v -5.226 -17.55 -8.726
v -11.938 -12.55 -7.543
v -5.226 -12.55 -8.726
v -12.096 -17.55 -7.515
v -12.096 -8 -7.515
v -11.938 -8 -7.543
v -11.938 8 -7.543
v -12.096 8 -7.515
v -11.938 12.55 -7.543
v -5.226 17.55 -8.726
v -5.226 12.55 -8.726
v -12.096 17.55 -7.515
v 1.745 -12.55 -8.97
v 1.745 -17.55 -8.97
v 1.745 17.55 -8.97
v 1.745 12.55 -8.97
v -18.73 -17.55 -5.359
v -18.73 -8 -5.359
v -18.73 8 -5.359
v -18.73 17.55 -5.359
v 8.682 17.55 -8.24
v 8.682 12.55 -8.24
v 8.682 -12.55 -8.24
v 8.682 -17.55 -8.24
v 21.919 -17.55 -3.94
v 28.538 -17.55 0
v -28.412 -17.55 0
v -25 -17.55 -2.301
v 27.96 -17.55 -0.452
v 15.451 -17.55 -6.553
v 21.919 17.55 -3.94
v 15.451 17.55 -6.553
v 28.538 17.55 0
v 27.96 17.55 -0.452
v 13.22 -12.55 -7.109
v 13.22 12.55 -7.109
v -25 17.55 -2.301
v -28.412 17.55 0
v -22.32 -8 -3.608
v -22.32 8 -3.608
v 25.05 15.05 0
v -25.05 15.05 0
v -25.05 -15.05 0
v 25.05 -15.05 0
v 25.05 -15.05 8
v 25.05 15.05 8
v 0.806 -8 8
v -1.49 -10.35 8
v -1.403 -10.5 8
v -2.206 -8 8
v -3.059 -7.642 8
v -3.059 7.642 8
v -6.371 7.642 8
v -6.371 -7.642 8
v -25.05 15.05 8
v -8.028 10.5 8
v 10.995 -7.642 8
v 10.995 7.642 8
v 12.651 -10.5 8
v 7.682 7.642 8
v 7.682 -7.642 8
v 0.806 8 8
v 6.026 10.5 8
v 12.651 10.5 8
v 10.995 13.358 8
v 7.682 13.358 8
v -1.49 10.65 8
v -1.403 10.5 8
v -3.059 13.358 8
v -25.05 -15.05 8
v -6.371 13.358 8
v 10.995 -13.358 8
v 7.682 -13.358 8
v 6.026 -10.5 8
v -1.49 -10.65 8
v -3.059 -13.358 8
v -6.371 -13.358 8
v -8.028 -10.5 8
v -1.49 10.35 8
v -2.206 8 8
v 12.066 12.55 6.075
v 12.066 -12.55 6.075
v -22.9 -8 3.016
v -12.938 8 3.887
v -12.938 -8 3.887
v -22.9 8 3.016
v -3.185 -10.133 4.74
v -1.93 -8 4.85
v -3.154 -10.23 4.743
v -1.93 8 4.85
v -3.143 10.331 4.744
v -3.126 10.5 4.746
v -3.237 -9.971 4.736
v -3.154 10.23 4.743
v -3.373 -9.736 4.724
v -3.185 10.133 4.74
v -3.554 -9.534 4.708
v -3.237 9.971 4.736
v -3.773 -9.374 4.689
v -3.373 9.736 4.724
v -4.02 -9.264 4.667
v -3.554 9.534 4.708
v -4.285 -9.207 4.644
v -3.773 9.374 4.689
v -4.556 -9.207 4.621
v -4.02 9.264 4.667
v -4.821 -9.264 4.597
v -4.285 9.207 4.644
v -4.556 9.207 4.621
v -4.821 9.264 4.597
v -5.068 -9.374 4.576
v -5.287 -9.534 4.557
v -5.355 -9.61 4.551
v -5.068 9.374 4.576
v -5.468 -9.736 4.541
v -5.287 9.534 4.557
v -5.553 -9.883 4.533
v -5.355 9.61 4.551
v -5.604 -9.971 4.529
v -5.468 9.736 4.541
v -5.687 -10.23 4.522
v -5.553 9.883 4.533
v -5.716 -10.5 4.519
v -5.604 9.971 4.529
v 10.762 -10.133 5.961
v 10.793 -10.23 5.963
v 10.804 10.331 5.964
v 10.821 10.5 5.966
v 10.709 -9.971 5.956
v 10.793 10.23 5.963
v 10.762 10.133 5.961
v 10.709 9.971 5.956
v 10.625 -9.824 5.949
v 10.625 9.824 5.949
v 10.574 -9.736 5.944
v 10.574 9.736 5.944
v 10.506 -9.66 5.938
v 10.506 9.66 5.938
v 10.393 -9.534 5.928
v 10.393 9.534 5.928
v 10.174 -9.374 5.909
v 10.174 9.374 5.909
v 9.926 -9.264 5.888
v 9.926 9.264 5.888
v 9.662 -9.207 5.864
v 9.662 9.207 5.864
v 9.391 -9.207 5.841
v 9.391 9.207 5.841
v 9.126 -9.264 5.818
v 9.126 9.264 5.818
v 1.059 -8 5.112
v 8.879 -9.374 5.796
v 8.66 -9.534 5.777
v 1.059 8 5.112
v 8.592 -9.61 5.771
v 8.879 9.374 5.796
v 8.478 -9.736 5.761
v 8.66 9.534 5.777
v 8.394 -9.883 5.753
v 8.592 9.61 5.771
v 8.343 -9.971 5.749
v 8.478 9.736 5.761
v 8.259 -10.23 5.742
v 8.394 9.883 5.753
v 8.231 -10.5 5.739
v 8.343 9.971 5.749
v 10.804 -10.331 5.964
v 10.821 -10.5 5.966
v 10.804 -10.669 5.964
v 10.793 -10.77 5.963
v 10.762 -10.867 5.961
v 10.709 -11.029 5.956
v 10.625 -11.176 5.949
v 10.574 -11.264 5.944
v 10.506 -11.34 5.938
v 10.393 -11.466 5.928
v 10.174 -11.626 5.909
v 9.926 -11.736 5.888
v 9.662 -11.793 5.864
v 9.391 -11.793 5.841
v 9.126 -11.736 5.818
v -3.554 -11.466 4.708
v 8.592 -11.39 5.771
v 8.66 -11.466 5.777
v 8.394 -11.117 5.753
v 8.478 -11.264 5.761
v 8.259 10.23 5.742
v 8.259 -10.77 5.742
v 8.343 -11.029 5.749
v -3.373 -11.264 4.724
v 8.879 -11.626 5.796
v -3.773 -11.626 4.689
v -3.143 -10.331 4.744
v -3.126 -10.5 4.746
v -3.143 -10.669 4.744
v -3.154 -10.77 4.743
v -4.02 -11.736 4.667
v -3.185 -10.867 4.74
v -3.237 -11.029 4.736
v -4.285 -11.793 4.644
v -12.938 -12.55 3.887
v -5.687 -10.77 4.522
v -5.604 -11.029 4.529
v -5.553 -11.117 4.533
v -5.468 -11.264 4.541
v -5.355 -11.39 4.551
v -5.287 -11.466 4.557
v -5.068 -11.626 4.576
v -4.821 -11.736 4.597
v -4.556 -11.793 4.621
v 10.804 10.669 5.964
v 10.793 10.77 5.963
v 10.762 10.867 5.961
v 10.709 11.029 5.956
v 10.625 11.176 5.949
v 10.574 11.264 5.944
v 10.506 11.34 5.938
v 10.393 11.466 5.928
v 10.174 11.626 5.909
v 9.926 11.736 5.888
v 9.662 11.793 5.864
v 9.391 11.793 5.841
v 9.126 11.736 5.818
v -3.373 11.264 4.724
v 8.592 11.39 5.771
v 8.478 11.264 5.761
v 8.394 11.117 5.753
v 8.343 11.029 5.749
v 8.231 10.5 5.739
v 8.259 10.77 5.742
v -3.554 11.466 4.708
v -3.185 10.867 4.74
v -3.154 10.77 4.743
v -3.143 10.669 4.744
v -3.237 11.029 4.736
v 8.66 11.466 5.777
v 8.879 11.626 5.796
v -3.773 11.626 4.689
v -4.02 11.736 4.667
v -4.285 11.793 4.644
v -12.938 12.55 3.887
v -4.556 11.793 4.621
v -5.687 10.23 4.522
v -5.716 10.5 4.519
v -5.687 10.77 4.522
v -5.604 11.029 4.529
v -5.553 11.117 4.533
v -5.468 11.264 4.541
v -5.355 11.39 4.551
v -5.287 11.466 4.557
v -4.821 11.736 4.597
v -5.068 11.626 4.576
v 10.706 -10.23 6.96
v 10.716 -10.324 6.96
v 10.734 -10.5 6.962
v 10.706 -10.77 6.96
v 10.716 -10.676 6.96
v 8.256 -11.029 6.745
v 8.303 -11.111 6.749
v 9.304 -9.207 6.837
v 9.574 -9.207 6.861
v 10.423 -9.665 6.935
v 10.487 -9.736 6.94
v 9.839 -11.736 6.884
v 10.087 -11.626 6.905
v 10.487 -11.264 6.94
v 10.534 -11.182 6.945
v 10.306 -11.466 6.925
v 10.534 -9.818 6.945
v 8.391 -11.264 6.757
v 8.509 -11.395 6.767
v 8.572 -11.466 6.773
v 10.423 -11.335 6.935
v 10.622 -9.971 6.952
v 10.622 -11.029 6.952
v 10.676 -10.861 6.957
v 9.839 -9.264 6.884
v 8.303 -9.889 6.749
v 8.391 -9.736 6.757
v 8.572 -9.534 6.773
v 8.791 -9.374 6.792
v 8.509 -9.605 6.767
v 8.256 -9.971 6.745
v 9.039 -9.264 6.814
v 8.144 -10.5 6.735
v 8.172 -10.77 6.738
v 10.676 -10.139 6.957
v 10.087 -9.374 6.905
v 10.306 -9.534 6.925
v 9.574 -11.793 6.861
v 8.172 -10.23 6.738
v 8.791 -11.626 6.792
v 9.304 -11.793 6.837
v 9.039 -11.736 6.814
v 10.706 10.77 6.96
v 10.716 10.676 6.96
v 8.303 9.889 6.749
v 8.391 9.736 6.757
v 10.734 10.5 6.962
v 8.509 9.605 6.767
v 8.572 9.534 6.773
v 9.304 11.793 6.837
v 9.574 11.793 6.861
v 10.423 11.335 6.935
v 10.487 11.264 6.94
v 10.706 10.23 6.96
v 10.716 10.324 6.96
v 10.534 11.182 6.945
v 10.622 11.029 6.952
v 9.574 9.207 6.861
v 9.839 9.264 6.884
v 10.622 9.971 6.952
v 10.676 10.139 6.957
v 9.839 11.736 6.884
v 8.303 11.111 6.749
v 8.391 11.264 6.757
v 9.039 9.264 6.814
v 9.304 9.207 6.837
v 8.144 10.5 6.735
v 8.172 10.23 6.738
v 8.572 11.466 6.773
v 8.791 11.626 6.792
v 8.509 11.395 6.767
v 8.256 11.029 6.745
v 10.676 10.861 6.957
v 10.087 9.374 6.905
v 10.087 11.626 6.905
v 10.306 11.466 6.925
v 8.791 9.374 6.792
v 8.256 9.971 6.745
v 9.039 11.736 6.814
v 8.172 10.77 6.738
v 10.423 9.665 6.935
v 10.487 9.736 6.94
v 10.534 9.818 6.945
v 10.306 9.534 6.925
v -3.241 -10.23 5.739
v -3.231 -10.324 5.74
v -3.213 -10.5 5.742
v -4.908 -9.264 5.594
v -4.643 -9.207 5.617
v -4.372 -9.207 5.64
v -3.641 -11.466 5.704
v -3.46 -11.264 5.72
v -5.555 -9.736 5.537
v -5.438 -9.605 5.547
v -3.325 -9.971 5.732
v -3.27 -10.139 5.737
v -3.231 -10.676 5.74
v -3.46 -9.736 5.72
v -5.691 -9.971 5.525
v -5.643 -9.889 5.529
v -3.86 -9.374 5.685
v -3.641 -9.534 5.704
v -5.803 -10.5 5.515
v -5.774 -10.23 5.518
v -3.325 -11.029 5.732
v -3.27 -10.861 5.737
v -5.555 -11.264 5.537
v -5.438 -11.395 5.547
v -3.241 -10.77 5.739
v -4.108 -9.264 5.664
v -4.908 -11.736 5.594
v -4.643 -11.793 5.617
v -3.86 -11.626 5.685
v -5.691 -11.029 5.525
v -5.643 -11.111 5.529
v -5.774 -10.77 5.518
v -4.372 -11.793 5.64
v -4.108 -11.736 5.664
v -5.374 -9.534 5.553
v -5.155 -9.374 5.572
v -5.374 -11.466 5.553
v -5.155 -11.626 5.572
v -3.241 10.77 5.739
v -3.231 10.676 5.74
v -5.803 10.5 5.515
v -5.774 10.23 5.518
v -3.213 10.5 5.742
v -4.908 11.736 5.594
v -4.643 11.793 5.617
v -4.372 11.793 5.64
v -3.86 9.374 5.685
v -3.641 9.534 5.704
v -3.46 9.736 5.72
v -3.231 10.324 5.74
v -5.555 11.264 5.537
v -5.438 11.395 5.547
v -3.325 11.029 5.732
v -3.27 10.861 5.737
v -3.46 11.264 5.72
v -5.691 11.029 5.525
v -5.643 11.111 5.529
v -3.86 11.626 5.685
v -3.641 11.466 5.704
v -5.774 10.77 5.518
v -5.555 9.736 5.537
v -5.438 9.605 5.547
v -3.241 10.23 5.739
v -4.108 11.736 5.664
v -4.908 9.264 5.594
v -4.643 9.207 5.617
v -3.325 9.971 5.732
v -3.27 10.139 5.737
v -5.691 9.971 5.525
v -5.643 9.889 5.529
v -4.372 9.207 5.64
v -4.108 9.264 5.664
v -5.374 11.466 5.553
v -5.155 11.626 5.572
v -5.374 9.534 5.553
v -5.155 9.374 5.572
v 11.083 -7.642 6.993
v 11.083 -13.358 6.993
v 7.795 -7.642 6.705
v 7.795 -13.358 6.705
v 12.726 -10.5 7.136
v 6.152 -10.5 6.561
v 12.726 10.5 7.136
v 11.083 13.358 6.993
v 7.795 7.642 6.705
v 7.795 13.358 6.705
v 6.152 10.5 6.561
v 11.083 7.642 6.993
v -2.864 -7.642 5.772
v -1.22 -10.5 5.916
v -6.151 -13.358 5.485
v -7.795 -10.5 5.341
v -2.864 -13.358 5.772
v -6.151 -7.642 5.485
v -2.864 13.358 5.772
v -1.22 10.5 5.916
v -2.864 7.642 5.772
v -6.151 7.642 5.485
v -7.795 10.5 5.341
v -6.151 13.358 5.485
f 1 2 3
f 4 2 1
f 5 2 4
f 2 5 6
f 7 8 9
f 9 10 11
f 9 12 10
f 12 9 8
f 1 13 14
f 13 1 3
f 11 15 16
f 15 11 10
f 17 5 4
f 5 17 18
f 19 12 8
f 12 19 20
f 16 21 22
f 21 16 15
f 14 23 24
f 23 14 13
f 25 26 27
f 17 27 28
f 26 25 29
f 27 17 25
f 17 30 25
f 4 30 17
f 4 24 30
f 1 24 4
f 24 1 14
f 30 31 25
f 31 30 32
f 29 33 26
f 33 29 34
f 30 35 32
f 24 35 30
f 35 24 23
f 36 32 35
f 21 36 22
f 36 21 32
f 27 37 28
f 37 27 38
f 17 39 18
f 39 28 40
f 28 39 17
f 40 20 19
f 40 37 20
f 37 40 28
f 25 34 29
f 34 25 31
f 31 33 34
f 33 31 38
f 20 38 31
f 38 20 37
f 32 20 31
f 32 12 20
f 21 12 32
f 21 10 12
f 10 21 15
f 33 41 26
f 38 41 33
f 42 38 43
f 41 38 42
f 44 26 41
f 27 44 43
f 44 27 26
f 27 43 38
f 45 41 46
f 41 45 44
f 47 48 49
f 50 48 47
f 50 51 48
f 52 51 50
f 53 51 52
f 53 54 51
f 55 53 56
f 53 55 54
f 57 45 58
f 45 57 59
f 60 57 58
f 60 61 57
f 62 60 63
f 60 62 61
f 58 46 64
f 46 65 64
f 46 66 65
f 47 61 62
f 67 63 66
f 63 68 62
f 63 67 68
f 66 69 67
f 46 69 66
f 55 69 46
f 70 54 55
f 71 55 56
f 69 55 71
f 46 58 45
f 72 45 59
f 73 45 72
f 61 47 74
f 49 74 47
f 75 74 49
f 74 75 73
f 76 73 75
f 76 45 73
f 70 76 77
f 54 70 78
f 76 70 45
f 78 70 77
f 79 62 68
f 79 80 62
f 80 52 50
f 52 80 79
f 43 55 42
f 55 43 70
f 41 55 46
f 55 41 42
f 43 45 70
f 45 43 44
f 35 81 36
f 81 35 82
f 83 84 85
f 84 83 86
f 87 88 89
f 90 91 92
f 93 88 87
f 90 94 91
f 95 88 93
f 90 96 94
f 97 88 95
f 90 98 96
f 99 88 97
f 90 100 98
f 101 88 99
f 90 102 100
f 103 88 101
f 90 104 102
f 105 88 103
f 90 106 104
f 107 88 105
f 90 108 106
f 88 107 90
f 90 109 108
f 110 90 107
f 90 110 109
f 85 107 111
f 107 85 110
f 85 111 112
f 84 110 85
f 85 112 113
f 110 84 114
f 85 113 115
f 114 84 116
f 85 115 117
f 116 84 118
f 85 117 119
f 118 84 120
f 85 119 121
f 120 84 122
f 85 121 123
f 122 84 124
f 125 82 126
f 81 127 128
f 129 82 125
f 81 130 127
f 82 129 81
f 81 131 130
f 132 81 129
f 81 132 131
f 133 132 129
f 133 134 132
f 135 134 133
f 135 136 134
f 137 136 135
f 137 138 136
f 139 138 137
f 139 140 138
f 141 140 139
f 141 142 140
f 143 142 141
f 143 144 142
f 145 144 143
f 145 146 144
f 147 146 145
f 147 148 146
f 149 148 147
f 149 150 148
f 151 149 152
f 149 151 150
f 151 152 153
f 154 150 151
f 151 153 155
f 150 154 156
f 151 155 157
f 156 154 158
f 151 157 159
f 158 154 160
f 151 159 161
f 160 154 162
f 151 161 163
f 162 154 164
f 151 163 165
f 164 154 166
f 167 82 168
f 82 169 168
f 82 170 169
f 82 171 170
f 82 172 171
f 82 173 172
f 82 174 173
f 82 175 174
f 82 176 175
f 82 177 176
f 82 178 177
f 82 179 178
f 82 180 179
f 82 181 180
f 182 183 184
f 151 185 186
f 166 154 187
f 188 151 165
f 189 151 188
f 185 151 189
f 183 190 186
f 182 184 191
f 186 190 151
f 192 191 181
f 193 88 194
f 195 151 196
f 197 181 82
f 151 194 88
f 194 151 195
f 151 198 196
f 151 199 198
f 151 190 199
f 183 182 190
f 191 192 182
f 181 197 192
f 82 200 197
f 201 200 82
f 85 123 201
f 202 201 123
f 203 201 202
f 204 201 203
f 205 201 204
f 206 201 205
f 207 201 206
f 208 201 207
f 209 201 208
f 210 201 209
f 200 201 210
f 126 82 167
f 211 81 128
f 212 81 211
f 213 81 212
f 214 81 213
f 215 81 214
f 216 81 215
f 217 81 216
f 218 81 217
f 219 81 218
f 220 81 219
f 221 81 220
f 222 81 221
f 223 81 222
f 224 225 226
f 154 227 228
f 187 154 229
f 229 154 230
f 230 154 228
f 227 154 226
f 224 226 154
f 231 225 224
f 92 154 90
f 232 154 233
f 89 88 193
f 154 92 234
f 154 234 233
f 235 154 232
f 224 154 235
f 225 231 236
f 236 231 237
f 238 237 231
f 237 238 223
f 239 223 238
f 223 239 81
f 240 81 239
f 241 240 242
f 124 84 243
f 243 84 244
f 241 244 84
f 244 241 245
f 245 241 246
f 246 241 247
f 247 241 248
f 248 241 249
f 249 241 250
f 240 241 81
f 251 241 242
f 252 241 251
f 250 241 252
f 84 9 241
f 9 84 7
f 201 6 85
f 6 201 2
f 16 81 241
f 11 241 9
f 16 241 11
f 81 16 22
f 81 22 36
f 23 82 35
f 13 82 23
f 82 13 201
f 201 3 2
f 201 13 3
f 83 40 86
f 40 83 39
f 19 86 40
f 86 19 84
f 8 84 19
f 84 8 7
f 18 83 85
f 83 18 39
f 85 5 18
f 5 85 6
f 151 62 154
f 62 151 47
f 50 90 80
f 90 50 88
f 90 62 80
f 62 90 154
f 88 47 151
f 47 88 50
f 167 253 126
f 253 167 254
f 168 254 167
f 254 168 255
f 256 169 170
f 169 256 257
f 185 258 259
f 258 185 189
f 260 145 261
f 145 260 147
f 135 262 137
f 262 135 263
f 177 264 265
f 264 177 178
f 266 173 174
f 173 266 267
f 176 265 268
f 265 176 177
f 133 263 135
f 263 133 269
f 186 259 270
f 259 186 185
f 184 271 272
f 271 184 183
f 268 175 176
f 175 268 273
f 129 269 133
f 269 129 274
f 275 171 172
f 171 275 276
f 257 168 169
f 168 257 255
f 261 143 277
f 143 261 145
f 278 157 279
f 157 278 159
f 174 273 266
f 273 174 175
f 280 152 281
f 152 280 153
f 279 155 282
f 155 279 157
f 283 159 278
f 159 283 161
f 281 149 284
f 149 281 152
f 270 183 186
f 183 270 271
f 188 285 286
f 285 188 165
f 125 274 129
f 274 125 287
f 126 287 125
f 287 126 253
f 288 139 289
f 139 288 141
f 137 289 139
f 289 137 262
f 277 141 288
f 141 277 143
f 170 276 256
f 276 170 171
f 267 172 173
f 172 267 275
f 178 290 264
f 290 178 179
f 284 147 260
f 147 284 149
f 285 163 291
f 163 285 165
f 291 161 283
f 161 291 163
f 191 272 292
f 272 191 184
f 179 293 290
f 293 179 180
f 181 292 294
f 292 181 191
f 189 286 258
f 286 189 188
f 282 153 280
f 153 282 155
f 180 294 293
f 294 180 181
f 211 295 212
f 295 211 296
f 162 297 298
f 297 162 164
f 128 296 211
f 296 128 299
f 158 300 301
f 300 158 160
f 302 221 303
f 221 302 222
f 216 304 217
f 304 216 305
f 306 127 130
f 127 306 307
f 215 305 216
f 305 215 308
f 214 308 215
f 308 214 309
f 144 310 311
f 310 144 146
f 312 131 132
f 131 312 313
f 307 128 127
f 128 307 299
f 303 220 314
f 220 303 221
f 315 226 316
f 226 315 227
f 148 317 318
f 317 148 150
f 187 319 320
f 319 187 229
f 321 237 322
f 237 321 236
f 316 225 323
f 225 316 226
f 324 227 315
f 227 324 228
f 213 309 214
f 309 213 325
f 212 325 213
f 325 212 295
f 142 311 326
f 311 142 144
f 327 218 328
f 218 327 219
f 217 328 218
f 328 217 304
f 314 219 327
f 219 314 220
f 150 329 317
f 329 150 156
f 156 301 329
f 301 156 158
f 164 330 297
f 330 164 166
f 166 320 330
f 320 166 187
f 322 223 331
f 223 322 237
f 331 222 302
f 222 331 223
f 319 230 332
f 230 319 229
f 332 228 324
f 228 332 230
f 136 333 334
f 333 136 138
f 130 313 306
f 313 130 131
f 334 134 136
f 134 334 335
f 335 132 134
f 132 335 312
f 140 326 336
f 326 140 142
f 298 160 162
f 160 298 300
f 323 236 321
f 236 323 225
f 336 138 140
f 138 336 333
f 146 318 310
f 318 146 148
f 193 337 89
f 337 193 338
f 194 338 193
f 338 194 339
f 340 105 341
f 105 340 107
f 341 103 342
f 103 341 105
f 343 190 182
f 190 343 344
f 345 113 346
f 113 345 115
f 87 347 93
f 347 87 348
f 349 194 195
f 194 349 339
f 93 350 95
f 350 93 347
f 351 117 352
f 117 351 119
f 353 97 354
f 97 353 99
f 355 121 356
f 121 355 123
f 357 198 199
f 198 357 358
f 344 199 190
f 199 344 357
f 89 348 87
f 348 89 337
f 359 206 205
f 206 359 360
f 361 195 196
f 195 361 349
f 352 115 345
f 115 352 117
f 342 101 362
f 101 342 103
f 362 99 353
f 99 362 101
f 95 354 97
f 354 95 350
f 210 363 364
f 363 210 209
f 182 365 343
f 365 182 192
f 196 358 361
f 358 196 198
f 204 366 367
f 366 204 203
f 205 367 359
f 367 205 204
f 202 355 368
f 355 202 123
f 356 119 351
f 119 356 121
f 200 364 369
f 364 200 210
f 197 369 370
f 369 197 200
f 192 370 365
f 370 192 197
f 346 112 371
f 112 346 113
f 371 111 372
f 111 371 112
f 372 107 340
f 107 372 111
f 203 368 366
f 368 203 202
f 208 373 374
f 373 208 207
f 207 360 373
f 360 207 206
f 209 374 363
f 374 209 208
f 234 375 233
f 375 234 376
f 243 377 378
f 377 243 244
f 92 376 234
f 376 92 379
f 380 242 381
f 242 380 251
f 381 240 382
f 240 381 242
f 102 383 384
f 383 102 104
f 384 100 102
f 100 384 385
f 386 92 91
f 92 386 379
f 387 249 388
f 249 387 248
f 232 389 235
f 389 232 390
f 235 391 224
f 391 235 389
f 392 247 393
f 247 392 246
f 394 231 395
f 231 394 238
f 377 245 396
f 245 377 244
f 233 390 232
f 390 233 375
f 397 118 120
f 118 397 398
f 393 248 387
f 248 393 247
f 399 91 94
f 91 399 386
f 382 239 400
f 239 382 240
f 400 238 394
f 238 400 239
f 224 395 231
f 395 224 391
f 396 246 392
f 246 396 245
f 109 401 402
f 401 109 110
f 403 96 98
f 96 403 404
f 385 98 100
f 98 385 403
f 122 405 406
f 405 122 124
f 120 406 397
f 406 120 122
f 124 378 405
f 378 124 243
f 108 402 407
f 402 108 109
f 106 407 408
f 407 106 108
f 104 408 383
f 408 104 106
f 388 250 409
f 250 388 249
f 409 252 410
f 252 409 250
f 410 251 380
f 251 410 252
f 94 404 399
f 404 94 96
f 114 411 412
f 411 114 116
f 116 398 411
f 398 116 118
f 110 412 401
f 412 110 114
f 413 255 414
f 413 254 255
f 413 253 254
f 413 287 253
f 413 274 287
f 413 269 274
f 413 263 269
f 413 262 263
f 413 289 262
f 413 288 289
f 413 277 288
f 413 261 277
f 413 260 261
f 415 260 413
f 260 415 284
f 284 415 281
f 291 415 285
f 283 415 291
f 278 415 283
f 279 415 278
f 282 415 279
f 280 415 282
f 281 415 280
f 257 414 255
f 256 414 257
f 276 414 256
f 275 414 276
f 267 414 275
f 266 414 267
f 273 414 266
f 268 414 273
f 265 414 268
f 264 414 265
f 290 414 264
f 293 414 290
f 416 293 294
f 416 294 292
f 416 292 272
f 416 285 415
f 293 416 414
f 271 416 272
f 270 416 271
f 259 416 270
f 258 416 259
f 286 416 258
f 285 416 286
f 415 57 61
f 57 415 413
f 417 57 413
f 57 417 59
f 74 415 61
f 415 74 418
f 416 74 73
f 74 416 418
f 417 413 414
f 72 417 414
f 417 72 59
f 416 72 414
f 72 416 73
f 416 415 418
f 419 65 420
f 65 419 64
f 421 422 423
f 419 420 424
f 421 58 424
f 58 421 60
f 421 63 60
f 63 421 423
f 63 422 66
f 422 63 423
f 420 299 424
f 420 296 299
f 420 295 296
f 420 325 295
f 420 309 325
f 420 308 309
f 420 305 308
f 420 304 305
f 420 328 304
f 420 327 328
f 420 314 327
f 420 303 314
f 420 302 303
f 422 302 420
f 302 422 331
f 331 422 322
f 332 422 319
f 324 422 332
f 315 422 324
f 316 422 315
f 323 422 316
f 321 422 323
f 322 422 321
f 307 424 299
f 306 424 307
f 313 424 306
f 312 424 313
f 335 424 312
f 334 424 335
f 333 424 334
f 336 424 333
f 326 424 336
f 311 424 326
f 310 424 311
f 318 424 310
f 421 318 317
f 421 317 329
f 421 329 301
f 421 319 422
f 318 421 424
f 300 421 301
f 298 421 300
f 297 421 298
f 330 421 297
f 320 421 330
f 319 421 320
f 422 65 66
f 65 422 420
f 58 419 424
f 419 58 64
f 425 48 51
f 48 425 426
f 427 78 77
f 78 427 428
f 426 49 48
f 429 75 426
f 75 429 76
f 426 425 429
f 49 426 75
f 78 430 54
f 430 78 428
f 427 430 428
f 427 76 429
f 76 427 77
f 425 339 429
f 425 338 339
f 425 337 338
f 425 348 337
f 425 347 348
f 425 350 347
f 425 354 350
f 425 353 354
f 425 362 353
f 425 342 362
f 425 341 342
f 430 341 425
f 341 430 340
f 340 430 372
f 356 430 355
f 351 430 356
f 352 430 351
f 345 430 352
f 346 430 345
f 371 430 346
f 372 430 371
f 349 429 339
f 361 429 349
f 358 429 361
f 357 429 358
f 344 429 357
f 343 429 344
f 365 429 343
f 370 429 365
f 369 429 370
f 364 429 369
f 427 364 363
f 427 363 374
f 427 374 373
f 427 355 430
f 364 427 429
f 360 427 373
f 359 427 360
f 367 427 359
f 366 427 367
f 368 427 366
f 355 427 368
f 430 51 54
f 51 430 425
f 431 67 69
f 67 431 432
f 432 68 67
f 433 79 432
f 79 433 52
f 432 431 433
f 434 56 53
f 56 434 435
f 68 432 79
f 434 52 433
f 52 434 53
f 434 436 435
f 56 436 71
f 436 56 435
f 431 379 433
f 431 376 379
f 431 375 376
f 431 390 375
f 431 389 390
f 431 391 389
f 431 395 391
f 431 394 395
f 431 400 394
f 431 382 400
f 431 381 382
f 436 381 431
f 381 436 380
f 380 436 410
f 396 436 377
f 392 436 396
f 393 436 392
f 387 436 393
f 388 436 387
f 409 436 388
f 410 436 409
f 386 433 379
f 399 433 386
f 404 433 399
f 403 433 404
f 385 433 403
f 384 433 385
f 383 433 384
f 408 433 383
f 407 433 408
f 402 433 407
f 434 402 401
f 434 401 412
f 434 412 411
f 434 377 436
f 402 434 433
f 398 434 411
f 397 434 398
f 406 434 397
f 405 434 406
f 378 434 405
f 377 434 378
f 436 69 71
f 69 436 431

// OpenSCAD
a = 100;
b = 42;
bMain = 80;

t = 10;

r = 5;
d = 20;

module square(a,b,t,r) {
hull(){
translate([a/2-r,b/2-r,0])cylinder(r=5,h=t,$fn=30);
translate([-a/2+r,-b/2+r,0])cylinder(r=5,h=t,$fn=30);
translate([-a/2+r,b/2-r,0])cylinder(r=5,h=t,$fn=30);
translate([a/2-r,-b/2+r,0])cylinder(r=5,h=t,$fn=30);
}
 }


module main(a,b,t,r,d, holes=true){
difference(){ 
   
translate([0,0, 0])square(a,b,t,r);
translate([0,0,-1])square(a-d,b-d,t+2,r); 
    
 if (holes){
translate([-(a+d)/2,b/2-d,t/2])rotate([0,90,00])cylinder(r=3/2,h=(a+d),$fn=30);
translate([-(a+d)/2,-b/2+d,t/2])rotate([0,90,00])cylinder(r=3/2,h=(a+d),$fn=30); 
translate([0,(b+d)/2,t/2])rotate([90,0,00])cylinder(r=3/2,h=(b+d),$fn=30); 
translate([a/2-d,(b+d)/2,t/2])rotate([90,0,00])cylinder(r=3/2,h=(b+d),$fn=30); 
translate([-a/2+d,(b+d)/2,t/2])rotate([90,0,00])cylinder(r=3/2,h=(b+d),$fn=30); 
    
translate([a/2-d+5,b/2-d/4,-t/2])rotate([0,0,0])cylinder(r=3/2,h=(b+d),$fn=30); 
translate([-a/2+d-5,b/2-d/4,-t/2])rotate([0,0,0])cylinder(r=3/2,h=(b+d),$fn=30); 
translate([a/2-d+5,-b/2+d/4,-t/2])rotate([0,0,0])cylinder(r=3/2,h=(b+d),$fn=30); 
translate([-a/2+d-5,-b/2+d/4,-t/2])rotate([0,0,0])cylinder(r=3/2,h=(b+d),$fn=30); 

translate([-a/2+d/4,-b/2+d/2,-t/2])rotate([0,0,0])cylinder(r=3/2,h=(b+d),$fn=30); 
translate([+a/2-d/4,-b/2+d/2,-t/2])rotate([0,0,0])cylinder(r=3/2,h=(b+d),$fn=30); 
translate([-a/2+d/4,-b/2+d/2,-t/2])rotate([0,0,0])cylinder(r=3/2,h=(b+d),$fn=30); 
    
translate([+a/2-d/4,-b/2+d/2,-t/2])rotate([0,0,0])cylinder(r=3/2,h=(b+d),$fn=30); 
translate([-a/2+d/4,+b/2-d/2,-t/2])rotate([0,0,0])cylinder(r=3/2,h=(b+d),$fn=30); 
translate([+a/2-d/4,+b/2-d/2,-t/2])rotate([0,0,0])cylinder(r=3/2,h=(b+d),$fn=30);   




}
}

}

module motor(a,b,t,r,d, holes=true){
difference(){
 union(){
  main(a,b,10,r,d, true);
  translate([0,0,0])cylinder(r=42/2,h=t,$fn=30);
 }
translate([0,0,-1])cylinder(r=22/2,h=t+2,$fn=30);
 
translate([0,-33/2,-t/2])rotate([0,0,0])cylinder(r=3/2,h=(b+d),$fn=30); 
translate([0,33/2,-t/2])rotate([0,0,0])cylinder(r=3/2,h=(b+d),$fn=30); 
translate([-33/2,0,-t/2])rotate([0,0,0])cylinder(r=3/2,h=(b+d),$fn=30); 
translate([33/2,0,-t/2])rotate([0,0,0])cylinder(r=3/2,h=(b+d),$fn=30); 
};
}


module tail(a,b,t,r,d,){
difference(){
main(a,55,16,r,d, true);

mirror([1,0,0])
translate([5,0,0])rotate([0,0,45])translate([0,0,3])cube([50,5,10]);
translate([5,0,0])rotate([0,0,45])translate([0,0,3])cube([50,5,10]);
translate([-60,-65-13,-20])cube([120,65,40]);
}
}


module servoHolder(a,b,t,r,d,){
difference(){
union(){
hull(){
translate([-23/2-10,-12-10,0])cube([23+30,2*12+20,1]);
translate([-23/2-5,-12-5,8])cube([23+10,2*12+10,1]);
}
hull(){
translate([12,-15/2,0])cube([50,15,1]);
translate([12,-15/2,8])cube([40,15,1]);
}

translate([-23/2-5,-12-5,-3])cube([23+10,2*12+10,3]);


}

translate([-23/2,-12.3,-20])cube([23,2*12.3,40]);
translate([+27/2,-6,-10])cylinder(r=1.2,h=30,$fn=50);
translate([+27/2,+6,-10])cylinder(r=1.2,h=30,$fn=50);
translate([-27/2,-6,-10])cylinder(r=1.2,h=30,$fn=50);
translate([-27/2,+6,-10])cylinder(r=1.2,h=30,$fn=50);
translate([40,-8.05/2,-10])cube([8.05,8.05,50]);
}
}


// ------------------------------
module wingMount(alpha=3) {
difference(){
    

   hull(){
    rotate([0,-alpha,0])translate([-160/2,-110/2,-4])cube([160,110,9]);
    translate([-10/2+100,-80/2,-0])cube([10,80,3]);
   }
   translate([-200/2,-200/2,-40])cube([200,200,40]);
   translate([-105/2+15-15,-80/2,-10])cube([120,80,40]);
   
   translate([50,+48,-10])cylinder(r=1.5,h=30,$fn=50);
   translate([50,-48,-10])cylinder(r=1.5,h=30,$fn=50);
   translate([-50,+48,-10])cylinder(r=1.5,h=30,$fn=50);
   translate([-50,-48,-10])cylinder(r=1.5,h=30,$fn=50);  
   
   translate([50,+48,-26])cylinder(r=7/2,h=30,$fn=6);
   translate([50,-48,-26])cylinder(r=7/2,h=30,$fn=6);
   translate([-50,+48,-26])cylinder(r=7/2,h=30,$fn=6);
   translate([-50,-48,-26])cylinder(r=7/2,h=30,$fn=6);   
   
}
hull(){
    translate([-10/2+82,-110/2,-0])cube([3,110,20]);
    translate([-10/2+100,-80/2,-0])cube([10,80,5]);
}

}
   
// ------------------------------

module piCamHolder(xcam=25.1, xcable=16.0, camTilt=5.0, zcamOff=10, zCircOff=41) {
  
  difference(){
  // ----------------------
  union(){
  difference(){
  hull(){
      translate([0,-xcam/2,zCircOff])
      rotate([90,0,0])
      cylinder(r=50,h=5,$fn=45);
      
      translate([0,xcam/2+5,zCircOff])
      rotate([90,0,0])
      cylinder(r=50,h=5,$fn=45);
  }
  translate([-100,-100,0])
  cube([200,200,200]);
  
  }
  translate([-(xcam+25)/2,-(xcam+5)/2,0])
  cube([xcam+25,xcam+5,8]);
  }
  
  // ----------------------
  color("red")  
  rotate([0,-camTilt,0])
  
  union(){
      translate([-xcam/2,-xcam/2,-zcamOff])cube([xcam,xcam,15]);
      translate([-xcam/2-10,-xcable/2,-zcamOff])cube([10,xcable,15]);
      translate([-3/2,-xcable/2,-zcamOff])cube([3,xcable,90]);  
  };

  // ----------------------
  rotate([0,-camTilt,0])translate([10,-21/2,-20]) cylinder(r=1.3,h=40,$fn=30);
  rotate([0,-camTilt,0])translate([10, 21/2,-20]) cylinder(r=1.3,h=40,$fn=30);
  rotate([0,-camTilt,0])translate([10-14,-21/2,-20]) cylinder(r=1.3,h=40,$fn=30);
  rotate([0,-camTilt,0])translate([10-14, 21/2,-20]) cylinder(r=1.3,h=40,$fn=30);
  
  rotate([0,-camTilt,0])translate([10, -21/2,6]) cylinder(r=3.3,h=40,$fn=6);
  rotate([0,-camTilt,0])translate([10, 21/2,6]) cylinder(r=3.3,h=40,$fn=6);
  rotate([0,-camTilt,0])translate([10-14, -21/2,6]) cylinder(r=3.3,h=40,$fn=6);
  rotate([0,-camTilt,0])translate([10-14, 21/2,6]) cylinder(r=3.3,h=40,$fn=6);
  }
  
  

}


piCamHolder();

//color("red")
//translate([7,0,10])
//rotate([0,-3,0])translate([-160/2,-110/2,-4])cube([153,110,10]);

//
